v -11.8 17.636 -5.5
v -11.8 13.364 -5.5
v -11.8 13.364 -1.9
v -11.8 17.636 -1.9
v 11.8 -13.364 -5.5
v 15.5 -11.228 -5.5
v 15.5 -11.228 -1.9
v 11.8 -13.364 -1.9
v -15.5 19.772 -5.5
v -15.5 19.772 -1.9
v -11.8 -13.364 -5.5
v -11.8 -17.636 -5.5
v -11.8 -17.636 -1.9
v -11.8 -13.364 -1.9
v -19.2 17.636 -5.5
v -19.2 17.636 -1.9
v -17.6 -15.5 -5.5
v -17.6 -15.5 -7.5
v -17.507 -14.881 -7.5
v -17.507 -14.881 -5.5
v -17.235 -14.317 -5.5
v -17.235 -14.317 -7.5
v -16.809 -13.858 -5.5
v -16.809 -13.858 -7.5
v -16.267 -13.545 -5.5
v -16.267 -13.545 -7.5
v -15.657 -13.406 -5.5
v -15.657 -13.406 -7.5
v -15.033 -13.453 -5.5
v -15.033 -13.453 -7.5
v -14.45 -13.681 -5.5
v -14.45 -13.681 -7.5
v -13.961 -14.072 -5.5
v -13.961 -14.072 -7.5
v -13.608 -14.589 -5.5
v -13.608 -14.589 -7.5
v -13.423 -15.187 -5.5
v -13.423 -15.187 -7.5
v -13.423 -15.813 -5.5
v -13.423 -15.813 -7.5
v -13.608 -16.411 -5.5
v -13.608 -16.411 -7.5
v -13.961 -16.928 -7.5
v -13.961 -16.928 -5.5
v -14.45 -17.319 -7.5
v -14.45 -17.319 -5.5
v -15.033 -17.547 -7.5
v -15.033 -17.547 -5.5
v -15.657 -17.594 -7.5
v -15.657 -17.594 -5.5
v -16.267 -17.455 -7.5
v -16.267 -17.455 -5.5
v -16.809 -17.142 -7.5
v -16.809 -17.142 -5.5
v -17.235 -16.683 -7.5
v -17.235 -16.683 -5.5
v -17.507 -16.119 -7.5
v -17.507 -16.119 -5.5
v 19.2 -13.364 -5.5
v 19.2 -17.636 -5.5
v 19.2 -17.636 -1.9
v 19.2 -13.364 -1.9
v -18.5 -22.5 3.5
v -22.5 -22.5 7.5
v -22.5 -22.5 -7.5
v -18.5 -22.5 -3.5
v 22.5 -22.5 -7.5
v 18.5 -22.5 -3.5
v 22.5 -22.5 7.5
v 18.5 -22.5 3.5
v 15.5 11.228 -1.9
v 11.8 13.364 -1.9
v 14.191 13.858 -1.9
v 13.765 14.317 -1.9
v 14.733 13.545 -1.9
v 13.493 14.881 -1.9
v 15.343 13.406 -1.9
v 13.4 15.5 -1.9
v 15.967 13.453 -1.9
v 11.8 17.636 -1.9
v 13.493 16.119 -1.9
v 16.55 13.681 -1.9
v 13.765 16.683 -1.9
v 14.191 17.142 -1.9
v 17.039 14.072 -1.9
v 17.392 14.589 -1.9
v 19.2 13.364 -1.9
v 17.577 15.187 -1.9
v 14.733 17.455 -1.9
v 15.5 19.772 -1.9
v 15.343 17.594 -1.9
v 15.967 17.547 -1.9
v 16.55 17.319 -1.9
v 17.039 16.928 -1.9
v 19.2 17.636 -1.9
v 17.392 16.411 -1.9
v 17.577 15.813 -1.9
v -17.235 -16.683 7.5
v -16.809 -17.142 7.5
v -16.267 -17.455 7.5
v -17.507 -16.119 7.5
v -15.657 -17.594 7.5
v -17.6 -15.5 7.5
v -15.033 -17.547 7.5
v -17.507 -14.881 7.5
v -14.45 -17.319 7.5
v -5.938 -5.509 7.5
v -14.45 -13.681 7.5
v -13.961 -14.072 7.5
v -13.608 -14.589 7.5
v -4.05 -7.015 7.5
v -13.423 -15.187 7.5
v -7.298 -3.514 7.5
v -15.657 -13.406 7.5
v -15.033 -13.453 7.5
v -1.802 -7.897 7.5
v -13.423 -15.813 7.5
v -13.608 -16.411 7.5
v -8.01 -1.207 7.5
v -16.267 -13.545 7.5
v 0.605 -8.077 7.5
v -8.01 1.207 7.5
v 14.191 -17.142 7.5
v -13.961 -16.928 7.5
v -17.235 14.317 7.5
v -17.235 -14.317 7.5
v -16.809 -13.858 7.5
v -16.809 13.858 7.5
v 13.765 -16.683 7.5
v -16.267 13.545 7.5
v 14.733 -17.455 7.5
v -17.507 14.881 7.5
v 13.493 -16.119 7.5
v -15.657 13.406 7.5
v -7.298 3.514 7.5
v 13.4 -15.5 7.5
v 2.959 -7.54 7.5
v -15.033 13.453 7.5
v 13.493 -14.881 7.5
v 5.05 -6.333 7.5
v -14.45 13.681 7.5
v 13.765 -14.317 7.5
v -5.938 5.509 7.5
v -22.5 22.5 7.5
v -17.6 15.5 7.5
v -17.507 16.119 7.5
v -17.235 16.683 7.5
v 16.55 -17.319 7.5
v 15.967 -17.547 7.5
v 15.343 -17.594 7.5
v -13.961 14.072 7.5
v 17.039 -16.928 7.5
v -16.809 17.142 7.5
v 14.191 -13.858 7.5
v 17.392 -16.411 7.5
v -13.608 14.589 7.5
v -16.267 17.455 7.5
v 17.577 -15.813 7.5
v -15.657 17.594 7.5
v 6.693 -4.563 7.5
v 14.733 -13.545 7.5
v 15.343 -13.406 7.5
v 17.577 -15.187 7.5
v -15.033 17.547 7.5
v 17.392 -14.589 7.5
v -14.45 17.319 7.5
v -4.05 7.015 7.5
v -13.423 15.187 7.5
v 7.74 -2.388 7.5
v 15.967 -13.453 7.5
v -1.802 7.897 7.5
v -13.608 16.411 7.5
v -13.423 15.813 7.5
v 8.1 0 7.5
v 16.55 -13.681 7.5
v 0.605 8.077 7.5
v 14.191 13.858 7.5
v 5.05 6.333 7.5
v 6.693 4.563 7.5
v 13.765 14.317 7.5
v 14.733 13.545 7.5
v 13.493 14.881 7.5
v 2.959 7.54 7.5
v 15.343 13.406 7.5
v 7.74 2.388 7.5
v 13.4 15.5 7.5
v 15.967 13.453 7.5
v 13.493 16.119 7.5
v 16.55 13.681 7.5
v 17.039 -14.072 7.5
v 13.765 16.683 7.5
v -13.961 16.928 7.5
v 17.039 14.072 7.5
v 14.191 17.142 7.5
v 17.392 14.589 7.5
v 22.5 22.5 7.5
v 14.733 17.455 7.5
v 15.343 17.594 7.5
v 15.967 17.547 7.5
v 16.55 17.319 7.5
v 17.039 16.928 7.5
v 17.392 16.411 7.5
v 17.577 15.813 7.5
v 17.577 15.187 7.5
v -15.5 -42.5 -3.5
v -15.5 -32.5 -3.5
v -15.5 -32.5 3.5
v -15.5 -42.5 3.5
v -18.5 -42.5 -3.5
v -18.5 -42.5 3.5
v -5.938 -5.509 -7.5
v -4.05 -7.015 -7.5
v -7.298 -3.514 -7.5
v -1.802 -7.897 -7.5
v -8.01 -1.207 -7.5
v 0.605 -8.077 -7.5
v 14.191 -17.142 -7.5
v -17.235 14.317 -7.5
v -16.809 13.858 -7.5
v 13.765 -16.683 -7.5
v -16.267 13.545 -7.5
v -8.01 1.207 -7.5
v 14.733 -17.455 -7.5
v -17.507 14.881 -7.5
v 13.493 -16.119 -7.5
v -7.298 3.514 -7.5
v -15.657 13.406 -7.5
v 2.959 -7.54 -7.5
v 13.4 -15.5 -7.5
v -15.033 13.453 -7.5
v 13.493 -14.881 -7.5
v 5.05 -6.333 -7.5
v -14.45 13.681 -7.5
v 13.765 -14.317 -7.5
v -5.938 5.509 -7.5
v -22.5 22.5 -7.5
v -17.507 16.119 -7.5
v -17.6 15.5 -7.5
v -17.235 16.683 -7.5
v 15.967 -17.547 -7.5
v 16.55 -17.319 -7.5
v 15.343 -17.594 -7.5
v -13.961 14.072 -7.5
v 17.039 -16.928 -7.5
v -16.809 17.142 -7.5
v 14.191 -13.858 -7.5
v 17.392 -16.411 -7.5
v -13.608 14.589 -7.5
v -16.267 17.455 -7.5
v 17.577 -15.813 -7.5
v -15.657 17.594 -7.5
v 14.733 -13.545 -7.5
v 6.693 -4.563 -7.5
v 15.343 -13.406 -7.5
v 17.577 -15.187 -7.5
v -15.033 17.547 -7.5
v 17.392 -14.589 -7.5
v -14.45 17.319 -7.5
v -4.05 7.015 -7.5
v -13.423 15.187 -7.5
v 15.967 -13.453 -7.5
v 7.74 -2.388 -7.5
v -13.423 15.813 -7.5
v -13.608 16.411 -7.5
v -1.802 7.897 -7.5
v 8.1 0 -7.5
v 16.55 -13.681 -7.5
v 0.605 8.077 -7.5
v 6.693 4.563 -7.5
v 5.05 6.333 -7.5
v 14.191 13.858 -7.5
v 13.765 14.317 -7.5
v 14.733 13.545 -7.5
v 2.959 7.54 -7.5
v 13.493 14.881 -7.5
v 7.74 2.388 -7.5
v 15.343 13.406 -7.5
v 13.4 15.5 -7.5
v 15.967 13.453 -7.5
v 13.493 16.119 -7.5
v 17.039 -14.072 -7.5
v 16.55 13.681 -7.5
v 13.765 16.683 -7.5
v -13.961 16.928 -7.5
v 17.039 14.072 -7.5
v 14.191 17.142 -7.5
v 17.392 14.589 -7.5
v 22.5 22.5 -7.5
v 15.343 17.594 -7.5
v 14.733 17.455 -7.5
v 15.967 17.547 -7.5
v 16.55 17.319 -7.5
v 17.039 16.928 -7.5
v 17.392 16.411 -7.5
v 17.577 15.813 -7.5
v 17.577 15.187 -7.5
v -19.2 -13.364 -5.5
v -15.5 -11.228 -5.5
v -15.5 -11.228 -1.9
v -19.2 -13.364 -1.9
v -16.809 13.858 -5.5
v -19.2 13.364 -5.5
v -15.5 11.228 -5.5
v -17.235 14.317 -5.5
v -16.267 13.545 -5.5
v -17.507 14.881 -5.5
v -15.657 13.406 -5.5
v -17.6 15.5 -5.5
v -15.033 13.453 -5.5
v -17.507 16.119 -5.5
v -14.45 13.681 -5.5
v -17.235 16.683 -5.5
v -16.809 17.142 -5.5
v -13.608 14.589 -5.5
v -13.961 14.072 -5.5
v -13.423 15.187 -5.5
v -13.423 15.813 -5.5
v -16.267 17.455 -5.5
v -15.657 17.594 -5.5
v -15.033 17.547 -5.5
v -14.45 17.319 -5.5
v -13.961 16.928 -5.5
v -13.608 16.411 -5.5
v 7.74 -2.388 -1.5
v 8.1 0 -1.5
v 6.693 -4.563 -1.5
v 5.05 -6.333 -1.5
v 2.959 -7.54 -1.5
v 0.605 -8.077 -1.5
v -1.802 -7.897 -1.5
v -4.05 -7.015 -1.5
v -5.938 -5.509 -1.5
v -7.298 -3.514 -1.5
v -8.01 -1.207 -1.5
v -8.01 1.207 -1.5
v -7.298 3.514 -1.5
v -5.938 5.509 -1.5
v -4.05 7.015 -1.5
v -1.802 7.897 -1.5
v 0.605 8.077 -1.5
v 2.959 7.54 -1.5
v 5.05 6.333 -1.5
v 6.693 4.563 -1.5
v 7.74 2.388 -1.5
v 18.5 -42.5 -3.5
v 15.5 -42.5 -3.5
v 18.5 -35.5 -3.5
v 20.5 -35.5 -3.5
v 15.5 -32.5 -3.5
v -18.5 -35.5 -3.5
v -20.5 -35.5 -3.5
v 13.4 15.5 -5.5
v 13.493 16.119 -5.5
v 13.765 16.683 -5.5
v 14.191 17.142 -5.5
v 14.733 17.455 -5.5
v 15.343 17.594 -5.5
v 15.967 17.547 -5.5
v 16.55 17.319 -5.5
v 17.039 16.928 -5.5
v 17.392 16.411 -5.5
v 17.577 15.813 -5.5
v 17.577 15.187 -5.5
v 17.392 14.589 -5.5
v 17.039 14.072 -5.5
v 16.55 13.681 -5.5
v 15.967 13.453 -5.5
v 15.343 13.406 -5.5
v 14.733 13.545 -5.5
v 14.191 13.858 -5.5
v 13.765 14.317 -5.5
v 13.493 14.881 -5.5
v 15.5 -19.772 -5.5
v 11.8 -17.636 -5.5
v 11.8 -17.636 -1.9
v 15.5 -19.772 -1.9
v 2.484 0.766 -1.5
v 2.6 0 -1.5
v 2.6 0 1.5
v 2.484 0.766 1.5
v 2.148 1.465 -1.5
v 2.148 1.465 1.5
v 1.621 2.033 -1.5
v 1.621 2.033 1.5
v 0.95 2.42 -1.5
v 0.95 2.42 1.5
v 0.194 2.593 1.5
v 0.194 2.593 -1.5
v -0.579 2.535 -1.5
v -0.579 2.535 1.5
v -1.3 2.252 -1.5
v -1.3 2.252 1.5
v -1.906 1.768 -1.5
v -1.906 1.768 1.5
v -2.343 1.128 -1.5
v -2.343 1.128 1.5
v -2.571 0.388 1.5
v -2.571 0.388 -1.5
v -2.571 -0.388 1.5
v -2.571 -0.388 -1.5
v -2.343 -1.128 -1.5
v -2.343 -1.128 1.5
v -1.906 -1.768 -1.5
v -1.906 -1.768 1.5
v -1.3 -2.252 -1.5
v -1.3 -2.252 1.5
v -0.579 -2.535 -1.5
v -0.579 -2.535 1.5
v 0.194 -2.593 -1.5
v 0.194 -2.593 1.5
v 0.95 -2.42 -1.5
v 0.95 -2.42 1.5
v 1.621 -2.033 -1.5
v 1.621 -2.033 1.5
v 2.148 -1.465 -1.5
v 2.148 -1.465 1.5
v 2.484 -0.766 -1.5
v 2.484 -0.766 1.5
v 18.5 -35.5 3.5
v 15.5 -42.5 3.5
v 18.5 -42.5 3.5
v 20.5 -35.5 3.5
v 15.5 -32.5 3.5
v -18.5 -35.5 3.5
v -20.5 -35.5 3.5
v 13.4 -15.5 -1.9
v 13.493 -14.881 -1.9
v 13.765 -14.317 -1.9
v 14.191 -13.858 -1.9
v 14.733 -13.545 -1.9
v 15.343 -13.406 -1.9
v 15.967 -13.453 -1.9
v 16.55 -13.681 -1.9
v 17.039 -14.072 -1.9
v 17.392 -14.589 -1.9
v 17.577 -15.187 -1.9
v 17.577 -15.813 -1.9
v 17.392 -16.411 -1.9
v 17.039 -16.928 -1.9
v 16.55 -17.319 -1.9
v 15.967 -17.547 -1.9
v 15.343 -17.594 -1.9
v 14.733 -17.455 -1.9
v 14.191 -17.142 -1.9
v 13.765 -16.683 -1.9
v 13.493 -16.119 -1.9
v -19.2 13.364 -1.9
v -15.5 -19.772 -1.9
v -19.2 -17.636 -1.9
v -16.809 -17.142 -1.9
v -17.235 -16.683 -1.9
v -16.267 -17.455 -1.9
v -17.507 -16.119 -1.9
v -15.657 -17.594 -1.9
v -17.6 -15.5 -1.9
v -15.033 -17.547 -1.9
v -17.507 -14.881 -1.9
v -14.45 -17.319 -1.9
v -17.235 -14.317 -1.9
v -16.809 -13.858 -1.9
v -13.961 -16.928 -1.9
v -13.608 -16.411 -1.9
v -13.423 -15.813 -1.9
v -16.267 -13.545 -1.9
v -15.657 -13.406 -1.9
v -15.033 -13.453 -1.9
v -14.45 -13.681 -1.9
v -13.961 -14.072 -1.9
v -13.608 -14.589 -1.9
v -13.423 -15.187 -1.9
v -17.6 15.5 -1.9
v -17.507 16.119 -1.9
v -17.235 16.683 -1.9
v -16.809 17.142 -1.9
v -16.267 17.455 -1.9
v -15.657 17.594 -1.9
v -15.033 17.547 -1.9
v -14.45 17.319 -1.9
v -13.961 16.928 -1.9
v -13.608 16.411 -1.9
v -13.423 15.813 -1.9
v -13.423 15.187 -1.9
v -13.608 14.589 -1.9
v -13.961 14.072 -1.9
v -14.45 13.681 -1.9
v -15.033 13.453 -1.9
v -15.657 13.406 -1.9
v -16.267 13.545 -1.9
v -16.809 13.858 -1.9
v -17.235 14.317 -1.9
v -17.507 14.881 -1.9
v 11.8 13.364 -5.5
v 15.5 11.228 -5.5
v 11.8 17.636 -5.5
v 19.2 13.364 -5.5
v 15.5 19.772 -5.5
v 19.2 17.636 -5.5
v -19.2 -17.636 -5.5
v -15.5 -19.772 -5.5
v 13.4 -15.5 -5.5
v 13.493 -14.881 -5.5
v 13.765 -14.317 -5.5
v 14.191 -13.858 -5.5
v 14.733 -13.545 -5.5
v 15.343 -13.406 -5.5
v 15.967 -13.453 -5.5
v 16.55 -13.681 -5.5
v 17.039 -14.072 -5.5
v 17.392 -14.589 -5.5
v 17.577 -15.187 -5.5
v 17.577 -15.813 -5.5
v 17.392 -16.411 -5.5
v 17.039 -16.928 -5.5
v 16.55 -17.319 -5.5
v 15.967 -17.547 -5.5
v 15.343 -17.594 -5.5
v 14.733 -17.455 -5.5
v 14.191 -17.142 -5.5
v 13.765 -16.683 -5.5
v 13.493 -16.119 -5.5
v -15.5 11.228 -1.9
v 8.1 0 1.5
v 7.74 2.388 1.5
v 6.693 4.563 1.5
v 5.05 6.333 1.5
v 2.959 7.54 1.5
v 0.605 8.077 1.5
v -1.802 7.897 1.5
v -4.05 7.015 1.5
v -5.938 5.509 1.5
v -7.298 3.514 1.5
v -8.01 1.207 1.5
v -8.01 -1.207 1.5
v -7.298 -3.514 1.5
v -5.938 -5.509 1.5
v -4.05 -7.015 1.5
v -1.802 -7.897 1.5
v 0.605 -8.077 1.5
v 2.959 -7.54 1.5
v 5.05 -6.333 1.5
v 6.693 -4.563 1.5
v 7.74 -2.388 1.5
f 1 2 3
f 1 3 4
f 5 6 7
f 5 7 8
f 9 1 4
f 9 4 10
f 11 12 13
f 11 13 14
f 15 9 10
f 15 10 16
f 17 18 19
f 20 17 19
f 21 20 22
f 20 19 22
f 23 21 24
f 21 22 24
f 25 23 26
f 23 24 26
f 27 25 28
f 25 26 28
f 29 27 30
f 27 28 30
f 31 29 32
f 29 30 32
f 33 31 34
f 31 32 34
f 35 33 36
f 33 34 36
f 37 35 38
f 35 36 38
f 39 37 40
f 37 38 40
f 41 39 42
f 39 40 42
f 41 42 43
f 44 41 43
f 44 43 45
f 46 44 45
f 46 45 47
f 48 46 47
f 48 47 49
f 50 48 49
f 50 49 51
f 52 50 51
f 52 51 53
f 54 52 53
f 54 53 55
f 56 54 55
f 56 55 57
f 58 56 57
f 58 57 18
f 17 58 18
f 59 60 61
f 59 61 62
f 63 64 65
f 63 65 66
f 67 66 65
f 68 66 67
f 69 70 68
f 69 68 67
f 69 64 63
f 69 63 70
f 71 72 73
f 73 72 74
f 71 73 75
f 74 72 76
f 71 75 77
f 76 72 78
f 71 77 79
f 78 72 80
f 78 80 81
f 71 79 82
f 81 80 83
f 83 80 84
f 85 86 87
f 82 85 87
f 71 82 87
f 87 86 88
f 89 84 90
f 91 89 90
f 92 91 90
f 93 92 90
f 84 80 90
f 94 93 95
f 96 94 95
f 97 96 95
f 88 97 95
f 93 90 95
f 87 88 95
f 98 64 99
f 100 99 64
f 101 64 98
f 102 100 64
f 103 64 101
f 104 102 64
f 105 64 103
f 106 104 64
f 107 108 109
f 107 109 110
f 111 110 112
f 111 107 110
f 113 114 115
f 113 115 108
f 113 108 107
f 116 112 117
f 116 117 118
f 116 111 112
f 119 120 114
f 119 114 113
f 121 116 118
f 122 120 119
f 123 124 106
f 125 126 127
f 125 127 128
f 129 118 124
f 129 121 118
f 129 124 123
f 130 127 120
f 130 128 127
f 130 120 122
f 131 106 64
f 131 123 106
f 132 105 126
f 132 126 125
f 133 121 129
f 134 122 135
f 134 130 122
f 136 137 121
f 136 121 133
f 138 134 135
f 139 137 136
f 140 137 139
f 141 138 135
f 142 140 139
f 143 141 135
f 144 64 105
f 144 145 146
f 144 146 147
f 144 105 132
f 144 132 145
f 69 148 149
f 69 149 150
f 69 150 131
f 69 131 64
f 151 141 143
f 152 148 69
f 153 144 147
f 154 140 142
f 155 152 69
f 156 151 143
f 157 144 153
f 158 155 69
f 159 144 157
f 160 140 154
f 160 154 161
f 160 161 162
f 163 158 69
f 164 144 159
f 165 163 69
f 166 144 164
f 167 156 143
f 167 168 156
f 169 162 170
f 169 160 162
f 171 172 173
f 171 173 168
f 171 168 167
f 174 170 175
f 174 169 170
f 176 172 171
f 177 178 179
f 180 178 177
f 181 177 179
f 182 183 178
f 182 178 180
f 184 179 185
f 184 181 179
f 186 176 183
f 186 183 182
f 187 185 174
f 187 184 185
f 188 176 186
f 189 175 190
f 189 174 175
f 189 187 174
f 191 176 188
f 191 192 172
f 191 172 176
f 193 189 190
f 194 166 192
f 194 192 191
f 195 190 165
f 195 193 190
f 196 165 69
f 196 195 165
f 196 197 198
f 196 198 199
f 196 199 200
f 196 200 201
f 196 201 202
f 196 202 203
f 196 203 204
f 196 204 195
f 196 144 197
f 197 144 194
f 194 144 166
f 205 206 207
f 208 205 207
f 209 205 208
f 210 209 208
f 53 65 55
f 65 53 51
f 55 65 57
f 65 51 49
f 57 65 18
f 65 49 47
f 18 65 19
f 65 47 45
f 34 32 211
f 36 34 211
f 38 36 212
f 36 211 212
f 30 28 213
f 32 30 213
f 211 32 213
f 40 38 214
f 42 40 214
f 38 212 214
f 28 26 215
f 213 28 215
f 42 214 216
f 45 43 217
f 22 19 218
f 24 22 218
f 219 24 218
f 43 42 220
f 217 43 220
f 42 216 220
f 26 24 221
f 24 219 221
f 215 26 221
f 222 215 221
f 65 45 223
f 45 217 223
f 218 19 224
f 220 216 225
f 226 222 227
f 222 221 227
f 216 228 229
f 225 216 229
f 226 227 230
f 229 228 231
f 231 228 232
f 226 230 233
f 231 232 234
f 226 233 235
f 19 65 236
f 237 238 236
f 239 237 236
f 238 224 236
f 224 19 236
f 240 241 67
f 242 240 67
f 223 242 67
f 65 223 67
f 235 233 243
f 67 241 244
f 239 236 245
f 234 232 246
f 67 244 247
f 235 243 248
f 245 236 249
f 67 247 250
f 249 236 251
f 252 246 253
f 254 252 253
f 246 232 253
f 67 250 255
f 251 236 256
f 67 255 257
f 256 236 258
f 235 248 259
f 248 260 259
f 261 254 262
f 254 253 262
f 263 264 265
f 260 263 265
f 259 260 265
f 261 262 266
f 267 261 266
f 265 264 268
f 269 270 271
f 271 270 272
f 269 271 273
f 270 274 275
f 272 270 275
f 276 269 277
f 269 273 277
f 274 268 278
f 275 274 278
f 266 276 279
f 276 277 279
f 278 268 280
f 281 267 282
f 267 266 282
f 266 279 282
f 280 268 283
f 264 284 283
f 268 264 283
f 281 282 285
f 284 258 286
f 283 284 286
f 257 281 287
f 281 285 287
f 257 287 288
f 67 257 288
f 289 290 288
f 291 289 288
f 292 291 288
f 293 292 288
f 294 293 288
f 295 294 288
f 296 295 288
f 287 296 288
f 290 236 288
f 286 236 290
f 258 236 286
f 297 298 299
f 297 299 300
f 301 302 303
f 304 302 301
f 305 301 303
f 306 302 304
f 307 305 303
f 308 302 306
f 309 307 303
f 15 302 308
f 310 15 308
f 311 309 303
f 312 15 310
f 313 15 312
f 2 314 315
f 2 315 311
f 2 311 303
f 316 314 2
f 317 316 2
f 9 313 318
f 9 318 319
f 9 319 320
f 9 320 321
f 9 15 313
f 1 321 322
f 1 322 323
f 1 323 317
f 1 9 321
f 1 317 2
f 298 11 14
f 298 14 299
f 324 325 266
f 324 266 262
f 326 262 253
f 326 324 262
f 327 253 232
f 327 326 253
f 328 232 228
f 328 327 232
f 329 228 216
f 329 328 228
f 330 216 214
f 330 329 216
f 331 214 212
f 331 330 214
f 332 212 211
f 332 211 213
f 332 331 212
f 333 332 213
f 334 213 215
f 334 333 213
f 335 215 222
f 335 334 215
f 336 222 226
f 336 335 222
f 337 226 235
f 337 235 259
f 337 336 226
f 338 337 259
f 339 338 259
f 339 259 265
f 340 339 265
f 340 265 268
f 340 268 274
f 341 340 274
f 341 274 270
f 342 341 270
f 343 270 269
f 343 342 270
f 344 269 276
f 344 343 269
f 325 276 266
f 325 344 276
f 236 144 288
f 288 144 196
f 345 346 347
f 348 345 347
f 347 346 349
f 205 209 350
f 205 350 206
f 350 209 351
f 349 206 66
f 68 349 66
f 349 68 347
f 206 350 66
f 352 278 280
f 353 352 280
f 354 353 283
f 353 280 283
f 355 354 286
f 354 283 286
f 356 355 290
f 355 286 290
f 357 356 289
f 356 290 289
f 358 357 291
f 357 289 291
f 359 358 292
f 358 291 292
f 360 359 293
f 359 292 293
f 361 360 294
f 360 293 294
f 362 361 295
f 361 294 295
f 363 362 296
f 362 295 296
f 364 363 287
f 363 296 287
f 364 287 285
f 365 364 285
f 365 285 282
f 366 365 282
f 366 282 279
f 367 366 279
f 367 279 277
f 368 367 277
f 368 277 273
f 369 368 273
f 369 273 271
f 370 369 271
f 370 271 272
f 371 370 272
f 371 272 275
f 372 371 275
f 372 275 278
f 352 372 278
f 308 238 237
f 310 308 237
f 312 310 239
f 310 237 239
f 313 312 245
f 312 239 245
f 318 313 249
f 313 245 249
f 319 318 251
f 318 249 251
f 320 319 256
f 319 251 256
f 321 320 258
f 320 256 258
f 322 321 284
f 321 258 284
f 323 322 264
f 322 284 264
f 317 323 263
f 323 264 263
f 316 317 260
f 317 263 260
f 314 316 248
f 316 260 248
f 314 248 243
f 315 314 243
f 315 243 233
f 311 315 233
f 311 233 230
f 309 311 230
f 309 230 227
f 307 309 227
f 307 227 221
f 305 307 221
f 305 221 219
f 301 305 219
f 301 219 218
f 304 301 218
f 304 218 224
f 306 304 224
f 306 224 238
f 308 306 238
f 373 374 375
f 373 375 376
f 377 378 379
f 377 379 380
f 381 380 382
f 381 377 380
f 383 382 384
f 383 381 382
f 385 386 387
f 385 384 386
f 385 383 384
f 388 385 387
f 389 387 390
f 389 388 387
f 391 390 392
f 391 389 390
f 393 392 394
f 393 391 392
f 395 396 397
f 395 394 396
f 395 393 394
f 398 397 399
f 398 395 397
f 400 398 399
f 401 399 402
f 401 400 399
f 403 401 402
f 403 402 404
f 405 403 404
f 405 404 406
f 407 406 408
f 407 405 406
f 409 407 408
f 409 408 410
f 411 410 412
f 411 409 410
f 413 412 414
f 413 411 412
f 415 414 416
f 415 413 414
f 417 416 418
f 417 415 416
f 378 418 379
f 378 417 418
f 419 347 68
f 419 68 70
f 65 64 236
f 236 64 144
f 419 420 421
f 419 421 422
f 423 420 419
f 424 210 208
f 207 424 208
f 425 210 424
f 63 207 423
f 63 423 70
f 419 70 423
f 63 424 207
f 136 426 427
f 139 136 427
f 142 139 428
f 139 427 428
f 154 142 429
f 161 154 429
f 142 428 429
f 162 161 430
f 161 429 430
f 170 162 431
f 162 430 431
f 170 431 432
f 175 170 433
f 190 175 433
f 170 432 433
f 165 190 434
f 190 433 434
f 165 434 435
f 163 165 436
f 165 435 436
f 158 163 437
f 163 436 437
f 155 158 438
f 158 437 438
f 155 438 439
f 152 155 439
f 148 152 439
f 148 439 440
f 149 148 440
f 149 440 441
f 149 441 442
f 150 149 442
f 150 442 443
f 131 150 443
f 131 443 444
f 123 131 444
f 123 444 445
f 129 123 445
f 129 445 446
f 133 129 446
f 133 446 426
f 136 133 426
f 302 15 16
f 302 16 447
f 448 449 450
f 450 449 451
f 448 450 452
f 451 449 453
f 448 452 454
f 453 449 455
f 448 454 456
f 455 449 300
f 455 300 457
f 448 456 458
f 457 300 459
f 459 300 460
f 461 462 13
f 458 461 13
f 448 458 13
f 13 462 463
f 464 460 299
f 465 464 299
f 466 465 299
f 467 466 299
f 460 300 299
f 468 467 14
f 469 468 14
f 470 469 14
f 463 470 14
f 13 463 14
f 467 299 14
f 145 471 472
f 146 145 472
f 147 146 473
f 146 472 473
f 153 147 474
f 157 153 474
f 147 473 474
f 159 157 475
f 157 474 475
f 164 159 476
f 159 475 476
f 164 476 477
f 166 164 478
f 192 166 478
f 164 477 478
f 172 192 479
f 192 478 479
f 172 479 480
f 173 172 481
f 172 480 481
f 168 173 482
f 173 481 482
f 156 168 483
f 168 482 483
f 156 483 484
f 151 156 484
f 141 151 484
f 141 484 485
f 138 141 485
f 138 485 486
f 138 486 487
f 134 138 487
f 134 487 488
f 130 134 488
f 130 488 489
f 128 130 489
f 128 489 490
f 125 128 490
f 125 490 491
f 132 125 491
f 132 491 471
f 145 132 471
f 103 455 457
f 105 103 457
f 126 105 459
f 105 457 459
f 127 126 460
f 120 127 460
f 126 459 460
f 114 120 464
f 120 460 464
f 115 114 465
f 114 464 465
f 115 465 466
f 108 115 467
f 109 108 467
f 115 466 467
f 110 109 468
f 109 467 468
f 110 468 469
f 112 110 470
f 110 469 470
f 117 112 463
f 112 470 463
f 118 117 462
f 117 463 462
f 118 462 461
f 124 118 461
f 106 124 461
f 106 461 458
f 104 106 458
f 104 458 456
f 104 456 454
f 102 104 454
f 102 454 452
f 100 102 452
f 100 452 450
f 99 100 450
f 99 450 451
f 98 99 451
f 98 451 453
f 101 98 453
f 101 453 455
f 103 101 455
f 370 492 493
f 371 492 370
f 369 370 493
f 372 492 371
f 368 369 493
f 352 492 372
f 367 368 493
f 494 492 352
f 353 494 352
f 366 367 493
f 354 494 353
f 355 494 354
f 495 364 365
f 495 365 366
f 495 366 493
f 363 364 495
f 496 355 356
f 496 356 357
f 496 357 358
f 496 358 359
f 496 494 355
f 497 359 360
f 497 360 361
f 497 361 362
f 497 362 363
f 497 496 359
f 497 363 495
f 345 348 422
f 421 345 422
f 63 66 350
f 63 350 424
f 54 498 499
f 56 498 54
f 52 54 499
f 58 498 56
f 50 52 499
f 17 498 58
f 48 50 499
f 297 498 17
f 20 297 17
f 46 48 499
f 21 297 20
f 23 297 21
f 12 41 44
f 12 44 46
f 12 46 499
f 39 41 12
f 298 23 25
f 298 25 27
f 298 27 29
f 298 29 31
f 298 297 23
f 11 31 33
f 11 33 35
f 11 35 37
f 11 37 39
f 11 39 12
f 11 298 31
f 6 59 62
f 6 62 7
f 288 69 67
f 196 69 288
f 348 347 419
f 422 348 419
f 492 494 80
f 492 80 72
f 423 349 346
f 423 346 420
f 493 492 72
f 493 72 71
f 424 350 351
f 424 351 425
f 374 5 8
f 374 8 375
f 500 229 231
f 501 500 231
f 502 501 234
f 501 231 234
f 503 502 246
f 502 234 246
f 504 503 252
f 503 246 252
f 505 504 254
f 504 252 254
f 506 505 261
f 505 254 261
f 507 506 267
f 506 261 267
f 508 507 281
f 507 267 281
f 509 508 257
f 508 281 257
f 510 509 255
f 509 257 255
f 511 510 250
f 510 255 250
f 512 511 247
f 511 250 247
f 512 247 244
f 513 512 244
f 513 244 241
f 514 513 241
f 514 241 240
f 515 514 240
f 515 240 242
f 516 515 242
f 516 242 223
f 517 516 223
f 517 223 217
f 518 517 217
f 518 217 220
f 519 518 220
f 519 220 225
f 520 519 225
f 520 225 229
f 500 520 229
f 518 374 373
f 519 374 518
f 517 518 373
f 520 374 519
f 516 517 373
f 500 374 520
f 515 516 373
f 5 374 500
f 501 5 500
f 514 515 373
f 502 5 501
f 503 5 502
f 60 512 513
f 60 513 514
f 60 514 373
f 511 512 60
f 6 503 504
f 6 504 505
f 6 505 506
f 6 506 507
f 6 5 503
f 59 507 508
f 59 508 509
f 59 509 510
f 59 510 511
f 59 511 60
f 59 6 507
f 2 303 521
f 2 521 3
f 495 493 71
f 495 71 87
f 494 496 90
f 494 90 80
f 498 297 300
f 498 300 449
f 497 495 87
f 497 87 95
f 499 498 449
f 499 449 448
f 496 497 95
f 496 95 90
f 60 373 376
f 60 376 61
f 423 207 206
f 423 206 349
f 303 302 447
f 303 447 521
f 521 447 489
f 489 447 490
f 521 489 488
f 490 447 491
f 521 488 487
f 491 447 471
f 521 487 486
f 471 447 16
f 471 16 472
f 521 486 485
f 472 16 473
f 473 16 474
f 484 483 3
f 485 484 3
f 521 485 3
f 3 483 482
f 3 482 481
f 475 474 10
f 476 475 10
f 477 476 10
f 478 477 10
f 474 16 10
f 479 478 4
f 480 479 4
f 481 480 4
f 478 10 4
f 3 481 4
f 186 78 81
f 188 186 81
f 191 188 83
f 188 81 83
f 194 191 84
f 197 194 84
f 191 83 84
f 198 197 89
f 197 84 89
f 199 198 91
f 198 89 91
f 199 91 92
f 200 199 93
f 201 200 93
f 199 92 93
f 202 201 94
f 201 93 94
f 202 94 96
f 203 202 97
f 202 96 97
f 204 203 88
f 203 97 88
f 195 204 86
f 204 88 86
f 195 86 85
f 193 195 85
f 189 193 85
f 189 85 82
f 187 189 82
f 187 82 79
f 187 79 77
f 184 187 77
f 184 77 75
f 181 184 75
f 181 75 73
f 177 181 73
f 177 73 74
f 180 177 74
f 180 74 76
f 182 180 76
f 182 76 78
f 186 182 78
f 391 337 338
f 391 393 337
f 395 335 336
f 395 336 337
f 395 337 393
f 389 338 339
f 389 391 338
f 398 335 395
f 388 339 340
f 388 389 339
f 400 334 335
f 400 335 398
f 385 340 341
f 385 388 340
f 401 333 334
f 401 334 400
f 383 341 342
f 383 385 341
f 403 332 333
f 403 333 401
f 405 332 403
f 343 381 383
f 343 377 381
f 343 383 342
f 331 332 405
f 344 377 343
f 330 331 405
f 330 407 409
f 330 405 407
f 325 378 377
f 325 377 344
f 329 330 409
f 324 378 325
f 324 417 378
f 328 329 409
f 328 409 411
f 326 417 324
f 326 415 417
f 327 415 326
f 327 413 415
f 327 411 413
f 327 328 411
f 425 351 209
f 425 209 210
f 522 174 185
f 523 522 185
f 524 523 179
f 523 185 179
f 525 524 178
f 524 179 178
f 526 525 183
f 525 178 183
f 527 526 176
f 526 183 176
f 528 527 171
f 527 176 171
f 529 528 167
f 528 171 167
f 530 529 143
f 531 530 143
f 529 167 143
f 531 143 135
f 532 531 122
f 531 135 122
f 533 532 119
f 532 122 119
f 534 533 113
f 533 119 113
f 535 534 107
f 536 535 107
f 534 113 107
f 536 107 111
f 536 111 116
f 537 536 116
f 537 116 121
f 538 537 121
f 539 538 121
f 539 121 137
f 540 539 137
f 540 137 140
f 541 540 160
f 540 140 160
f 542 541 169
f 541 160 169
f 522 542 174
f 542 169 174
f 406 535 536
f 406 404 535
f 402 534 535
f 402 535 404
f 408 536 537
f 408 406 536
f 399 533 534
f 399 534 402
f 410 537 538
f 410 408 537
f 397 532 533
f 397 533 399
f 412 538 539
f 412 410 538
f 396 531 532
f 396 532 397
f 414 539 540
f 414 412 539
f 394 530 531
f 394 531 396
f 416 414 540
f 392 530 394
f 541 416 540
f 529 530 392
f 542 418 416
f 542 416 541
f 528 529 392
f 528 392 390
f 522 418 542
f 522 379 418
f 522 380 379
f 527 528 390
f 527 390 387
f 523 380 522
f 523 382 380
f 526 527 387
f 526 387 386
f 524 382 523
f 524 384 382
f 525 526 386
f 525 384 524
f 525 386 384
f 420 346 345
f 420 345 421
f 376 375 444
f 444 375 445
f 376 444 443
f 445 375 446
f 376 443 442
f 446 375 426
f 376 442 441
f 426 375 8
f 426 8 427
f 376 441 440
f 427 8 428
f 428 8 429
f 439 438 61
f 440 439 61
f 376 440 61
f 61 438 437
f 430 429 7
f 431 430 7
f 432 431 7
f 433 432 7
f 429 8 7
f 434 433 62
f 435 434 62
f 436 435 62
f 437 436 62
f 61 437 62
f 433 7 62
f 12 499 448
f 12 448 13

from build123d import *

# Parameters (mm, degrees)
SKETCH1_W           = 45
SKETCH1_H           = 45
SKETCH1_R           = 2.6
BOSS_EXTRUDE1_DEPTH = 7.5
SKETCH2_R           = 8.1
CUT_EXTRUDE1_DEPTH  = 6
CUT_EXTRUDE4_START  = -6
SKETCH5_R           = 8.1
CUT_EXTRUDE4_DEPTH  = 6
SKETCH7_W           = 37
SKETCH7_H           = 7
BOSS_EXTRUDE2_DEPTH = 10
CUT_EXTRUDE6_START  = 2
CUT_EXTRUDE6_DEPTH  = 3.6
SKETCH8_R           = 2.1
CUT_EXTRUDE7_DEPTH  = 43.278836313
SKETCH9_W           = 3
SKETCH9_H           = 7
BOSS_EXTRUDE3_DEPTH = 10
SKETCH10_W          = 7
SKETCH10_H          = 7
BOSS_EXTRUDE4_DEPTH = 2
CHAMFER2_SIZE2      = 7
CHAMFER2_SIZE       = 2
CHAMFER3_SIZE2      = 7
CHAMFER3_SIZE       = 2


with BuildPart() as part:
    # Sketch1 → Boss-Extrude1 (new, symmetric)
    with BuildSketch(Plane.XY):
        Rectangle(SKETCH1_W, SKETCH1_H)
        Circle(SKETCH1_R, mode=Mode.SUBTRACT)
    extrude(amount=BOSS_EXTRUDE1_DEPTH, both=True)

    # Sketch2 → Cut-Extrude1 (cut)
    with BuildSketch(Plane.XY.offset(7.5)):
        Circle(SKETCH2_R)
    extrude(amount=-CUT_EXTRUDE1_DEPTH, mode=Mode.SUBTRACT)

    # Sketch5 → Cut-Extrude4 (cut)
    with BuildSketch(Plane(origin=(0, 0, -7.5), x_dir=(-1, 0, 0), z_dir=(0, 0, -1)).offset(CUT_EXTRUDE4_START)):
        with Locations(Location((0, 0, 0), (0, 0, 180))):
            Circle(SKETCH5_R)
    extrude(amount=CUT_EXTRUDE4_DEPTH, mode=Mode.SUBTRACT)

    # Sketch7 → Boss-Extrude2 (add)
    with BuildSketch(Plane.XZ.offset(22.5)):
        Rectangle(SKETCH7_W, SKETCH7_H)
    extrude(amount=BOSS_EXTRUDE2_DEPTH)

    # Sketch6 → Cut-Extrude6 (cut)
    with BuildSketch(Plane.XY.offset(-7.5).offset(CUT_EXTRUDE6_START)):
        Polygon((19.2, 17.636195996), (15.5, 19.772391992), (11.8, 17.636195996), (11.8, 13.363804004), (15.5, 11.227608008), (19.2, 13.363804004), align=None)
        Polygon((-11.8, 17.636195996), (-15.5, 19.772391992), (-19.2, 17.636195996), (-19.2, 13.363804004), (-15.5, 11.227608008), (-11.8, 13.363804004), align=None)
        Polygon((19.2, -13.363804004), (15.5, -11.227608008), (11.8, -13.363804004), (11.8, -17.636195996), (15.5, -19.772391992), (19.2, -17.636195996), align=None)
        Polygon((-11.8, -13.363804004), (-15.5, -11.227608008), (-19.2, -13.363804004), (-19.2, -17.636195996), (-15.5, -19.772391992), (-11.8, -17.636195996), align=None)
    extrude(amount=CUT_EXTRUDE6_DEPTH, mode=Mode.SUBTRACT)

    # Sketch8 → Cut-Extrude7 (cut, through all)
    with BuildSketch(Plane(origin=(0, 0, -7.5), x_dir=(-1, 0, 0), z_dir=(0, 0, -1))):
        with Locations((-15.5, 15.5)):
            Circle(SKETCH8_R)
        with Locations((15.5, 15.5)):
            Circle(SKETCH8_R)
        with Locations((15.5, -15.5)):
            Circle(SKETCH8_R)
        with Locations((-15.5, -15.5)):
            Circle(SKETCH8_R)
    extrude(amount=-CUT_EXTRUDE7_DEPTH, mode=Mode.SUBTRACT)

    # Sketch9 → Boss-Extrude3 (add)
    with BuildSketch(Plane.XZ.offset(32.5)):
        with Locations((-17, 0)):
            Rectangle(SKETCH9_W, SKETCH9_H)
        with Locations((17, 0)):
            Rectangle(SKETCH9_W, SKETCH9_H)
    extrude(amount=BOSS_EXTRUDE3_DEPTH)

    # Sketch10 → Boss-Extrude4 (add)
    with BuildSketch(Plane.ZY.offset(18.5)):
        with Locations((0, -39)):
            Rectangle(SKETCH10_W, SKETCH10_H)
    boss_extrude4 = extrude(amount=BOSS_EXTRUDE4_DEPTH)

    # Mirror1: Boss-Extrude4 across plane
    add(boss_extrude4.mirror(Plane(origin=(0, 0, 0), x_dir=(0, 0, 1), z_dir=(1, 0, 0))))

    # Chamfer2
    chamfer2_edges = [part.edges().sort_by_distance(p)[0] for p in [
        (-20.5, -42.5, 0),
    ]]
    chamfer2_side = [part.faces().sort_by_distance(p)[0] for p in [
        (-20.46, -42.5, 0),
    ]]
    chamfer(chamfer2_edges, length=CHAMFER2_SIZE - 0.0001, length2=CHAMFER2_SIZE2 - 0.0001, reference=chamfer2_side[0])  # a hair under: the kernel refuses the full size

    # Chamfer3
    chamfer3_edges = [part.edges().sort_by_distance(p)[0] for p in [
        (20.5, -42.5, 0),
    ]]
    chamfer3_side = [part.faces().sort_by_distance(p)[0] for p in [
        (20.46, -42.5, 0),
    ]]
    chamfer(chamfer3_edges, length=CHAMFER3_SIZE - 0.0001, length2=CHAMFER3_SIZE2 - 0.0001, reference=chamfer3_side[0])  # a hair under: the kernel refuses the full size


solid = part.part
